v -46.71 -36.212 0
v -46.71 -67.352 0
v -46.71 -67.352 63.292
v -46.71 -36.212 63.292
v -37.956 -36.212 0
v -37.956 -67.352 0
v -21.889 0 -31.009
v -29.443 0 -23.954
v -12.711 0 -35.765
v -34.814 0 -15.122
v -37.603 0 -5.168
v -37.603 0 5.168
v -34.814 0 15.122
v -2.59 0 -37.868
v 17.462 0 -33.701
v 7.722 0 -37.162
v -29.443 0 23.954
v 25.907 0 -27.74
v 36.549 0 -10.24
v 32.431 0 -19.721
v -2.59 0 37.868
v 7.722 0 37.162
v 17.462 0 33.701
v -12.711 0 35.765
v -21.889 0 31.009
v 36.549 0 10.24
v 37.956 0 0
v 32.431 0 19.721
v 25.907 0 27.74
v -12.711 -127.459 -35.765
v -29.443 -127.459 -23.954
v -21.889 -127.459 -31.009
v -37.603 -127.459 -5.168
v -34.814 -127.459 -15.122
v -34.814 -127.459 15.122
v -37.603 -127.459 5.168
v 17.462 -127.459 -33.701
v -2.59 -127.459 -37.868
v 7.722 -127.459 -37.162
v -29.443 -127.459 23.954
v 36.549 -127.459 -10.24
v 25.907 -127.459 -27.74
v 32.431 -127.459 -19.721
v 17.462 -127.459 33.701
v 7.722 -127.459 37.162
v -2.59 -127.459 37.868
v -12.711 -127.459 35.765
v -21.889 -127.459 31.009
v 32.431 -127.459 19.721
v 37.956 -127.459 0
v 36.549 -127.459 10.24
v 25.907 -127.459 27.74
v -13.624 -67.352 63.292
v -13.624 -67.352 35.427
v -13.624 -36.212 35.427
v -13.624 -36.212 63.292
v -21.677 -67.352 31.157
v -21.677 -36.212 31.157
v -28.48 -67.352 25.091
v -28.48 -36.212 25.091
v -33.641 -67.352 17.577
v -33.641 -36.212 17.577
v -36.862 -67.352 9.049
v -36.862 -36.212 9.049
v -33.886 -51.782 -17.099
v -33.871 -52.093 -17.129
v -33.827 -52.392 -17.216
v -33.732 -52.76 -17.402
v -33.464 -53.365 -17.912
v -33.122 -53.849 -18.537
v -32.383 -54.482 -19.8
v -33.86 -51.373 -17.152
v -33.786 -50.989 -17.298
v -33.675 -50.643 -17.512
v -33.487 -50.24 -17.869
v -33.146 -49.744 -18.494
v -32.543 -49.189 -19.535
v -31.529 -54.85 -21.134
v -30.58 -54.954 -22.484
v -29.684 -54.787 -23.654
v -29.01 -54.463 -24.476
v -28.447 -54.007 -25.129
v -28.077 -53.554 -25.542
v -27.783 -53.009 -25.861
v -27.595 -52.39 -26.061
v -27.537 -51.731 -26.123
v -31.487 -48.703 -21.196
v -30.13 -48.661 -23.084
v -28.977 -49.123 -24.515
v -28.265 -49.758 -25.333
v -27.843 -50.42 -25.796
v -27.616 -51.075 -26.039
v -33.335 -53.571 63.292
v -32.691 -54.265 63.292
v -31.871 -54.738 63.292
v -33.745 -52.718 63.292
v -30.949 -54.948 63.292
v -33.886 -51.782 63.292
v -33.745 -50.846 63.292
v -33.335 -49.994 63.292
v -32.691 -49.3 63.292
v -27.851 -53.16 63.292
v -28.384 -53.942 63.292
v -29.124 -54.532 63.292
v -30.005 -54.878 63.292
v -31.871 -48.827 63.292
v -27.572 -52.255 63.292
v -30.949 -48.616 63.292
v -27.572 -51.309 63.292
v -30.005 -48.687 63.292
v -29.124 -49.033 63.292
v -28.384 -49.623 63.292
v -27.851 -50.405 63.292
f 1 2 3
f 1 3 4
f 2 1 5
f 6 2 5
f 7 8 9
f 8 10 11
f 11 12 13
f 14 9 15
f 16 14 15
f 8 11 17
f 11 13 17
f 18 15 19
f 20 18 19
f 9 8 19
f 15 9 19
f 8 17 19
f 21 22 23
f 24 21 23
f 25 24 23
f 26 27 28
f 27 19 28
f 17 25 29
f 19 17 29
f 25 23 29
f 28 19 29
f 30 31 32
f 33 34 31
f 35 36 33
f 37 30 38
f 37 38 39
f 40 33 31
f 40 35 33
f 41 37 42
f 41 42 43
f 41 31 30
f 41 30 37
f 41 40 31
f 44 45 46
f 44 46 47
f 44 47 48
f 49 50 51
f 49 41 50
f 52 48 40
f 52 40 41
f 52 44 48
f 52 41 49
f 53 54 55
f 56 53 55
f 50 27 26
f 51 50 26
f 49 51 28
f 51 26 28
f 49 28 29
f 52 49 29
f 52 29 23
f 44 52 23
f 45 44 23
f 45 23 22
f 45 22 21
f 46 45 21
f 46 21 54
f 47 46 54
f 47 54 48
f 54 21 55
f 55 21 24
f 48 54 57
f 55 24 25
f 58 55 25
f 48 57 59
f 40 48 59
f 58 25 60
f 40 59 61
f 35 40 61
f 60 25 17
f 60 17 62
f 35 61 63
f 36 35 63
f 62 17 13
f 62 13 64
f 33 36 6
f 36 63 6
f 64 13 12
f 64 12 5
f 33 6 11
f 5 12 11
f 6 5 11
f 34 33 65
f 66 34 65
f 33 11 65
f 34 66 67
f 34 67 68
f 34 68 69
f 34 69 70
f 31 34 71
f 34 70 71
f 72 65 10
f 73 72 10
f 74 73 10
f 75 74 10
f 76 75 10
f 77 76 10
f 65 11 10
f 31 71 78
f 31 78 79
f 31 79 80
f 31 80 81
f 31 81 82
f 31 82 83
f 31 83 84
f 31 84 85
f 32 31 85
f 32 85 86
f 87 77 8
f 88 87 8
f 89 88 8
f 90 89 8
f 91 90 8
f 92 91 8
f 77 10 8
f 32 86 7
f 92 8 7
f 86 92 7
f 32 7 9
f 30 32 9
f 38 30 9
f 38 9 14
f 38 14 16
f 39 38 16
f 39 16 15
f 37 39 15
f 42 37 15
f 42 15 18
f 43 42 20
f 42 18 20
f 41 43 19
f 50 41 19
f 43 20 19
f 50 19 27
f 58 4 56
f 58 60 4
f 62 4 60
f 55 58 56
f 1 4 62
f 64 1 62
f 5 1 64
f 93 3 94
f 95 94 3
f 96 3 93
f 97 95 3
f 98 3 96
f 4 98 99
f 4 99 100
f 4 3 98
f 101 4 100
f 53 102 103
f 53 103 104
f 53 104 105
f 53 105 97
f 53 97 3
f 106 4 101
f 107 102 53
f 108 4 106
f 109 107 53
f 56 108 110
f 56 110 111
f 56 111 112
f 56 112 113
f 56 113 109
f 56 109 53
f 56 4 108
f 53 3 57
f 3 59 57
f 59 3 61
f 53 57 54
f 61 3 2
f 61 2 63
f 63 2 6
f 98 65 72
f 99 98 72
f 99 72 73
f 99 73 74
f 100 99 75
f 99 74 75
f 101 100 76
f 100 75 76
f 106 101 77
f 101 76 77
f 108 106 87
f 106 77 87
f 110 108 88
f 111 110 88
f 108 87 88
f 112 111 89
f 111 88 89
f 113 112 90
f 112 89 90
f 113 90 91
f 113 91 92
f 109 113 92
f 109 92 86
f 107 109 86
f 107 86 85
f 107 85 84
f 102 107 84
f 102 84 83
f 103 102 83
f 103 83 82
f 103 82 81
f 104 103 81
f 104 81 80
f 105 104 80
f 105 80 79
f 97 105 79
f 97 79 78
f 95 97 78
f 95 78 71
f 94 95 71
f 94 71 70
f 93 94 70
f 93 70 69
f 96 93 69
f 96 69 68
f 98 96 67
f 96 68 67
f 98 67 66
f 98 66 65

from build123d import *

# Parameters (mm, degrees)
F0_R     = 37.956289
F1_DEPTH = 127.45938
F2_W     = 33.085958
F2_H     = 31.139728
F3_DEPTH = 63.29228
F5_D     = 6.35


with BuildPart() as f1:
    # F0 (on Front) → F1 (new body)
    with BuildSketch(Plane.XZ):
        Circle(F0_R)
    extrude(amount=F1_DEPTH)

    # F2 (on Top) → F3 (join)
    with BuildSketch(Plane.XY):
        with Locations((-30.166611, -51.782193)):
            Rectangle(F2_W, F2_H)
    extrude(amount=F3_DEPTH)

    # F5 (through all)
    with Locations(Plane.XY.offset(63.29228)):
        with Locations((-30.711466, -51.782193)):
            Hole(F5_D / 2)


solid = f1.part
